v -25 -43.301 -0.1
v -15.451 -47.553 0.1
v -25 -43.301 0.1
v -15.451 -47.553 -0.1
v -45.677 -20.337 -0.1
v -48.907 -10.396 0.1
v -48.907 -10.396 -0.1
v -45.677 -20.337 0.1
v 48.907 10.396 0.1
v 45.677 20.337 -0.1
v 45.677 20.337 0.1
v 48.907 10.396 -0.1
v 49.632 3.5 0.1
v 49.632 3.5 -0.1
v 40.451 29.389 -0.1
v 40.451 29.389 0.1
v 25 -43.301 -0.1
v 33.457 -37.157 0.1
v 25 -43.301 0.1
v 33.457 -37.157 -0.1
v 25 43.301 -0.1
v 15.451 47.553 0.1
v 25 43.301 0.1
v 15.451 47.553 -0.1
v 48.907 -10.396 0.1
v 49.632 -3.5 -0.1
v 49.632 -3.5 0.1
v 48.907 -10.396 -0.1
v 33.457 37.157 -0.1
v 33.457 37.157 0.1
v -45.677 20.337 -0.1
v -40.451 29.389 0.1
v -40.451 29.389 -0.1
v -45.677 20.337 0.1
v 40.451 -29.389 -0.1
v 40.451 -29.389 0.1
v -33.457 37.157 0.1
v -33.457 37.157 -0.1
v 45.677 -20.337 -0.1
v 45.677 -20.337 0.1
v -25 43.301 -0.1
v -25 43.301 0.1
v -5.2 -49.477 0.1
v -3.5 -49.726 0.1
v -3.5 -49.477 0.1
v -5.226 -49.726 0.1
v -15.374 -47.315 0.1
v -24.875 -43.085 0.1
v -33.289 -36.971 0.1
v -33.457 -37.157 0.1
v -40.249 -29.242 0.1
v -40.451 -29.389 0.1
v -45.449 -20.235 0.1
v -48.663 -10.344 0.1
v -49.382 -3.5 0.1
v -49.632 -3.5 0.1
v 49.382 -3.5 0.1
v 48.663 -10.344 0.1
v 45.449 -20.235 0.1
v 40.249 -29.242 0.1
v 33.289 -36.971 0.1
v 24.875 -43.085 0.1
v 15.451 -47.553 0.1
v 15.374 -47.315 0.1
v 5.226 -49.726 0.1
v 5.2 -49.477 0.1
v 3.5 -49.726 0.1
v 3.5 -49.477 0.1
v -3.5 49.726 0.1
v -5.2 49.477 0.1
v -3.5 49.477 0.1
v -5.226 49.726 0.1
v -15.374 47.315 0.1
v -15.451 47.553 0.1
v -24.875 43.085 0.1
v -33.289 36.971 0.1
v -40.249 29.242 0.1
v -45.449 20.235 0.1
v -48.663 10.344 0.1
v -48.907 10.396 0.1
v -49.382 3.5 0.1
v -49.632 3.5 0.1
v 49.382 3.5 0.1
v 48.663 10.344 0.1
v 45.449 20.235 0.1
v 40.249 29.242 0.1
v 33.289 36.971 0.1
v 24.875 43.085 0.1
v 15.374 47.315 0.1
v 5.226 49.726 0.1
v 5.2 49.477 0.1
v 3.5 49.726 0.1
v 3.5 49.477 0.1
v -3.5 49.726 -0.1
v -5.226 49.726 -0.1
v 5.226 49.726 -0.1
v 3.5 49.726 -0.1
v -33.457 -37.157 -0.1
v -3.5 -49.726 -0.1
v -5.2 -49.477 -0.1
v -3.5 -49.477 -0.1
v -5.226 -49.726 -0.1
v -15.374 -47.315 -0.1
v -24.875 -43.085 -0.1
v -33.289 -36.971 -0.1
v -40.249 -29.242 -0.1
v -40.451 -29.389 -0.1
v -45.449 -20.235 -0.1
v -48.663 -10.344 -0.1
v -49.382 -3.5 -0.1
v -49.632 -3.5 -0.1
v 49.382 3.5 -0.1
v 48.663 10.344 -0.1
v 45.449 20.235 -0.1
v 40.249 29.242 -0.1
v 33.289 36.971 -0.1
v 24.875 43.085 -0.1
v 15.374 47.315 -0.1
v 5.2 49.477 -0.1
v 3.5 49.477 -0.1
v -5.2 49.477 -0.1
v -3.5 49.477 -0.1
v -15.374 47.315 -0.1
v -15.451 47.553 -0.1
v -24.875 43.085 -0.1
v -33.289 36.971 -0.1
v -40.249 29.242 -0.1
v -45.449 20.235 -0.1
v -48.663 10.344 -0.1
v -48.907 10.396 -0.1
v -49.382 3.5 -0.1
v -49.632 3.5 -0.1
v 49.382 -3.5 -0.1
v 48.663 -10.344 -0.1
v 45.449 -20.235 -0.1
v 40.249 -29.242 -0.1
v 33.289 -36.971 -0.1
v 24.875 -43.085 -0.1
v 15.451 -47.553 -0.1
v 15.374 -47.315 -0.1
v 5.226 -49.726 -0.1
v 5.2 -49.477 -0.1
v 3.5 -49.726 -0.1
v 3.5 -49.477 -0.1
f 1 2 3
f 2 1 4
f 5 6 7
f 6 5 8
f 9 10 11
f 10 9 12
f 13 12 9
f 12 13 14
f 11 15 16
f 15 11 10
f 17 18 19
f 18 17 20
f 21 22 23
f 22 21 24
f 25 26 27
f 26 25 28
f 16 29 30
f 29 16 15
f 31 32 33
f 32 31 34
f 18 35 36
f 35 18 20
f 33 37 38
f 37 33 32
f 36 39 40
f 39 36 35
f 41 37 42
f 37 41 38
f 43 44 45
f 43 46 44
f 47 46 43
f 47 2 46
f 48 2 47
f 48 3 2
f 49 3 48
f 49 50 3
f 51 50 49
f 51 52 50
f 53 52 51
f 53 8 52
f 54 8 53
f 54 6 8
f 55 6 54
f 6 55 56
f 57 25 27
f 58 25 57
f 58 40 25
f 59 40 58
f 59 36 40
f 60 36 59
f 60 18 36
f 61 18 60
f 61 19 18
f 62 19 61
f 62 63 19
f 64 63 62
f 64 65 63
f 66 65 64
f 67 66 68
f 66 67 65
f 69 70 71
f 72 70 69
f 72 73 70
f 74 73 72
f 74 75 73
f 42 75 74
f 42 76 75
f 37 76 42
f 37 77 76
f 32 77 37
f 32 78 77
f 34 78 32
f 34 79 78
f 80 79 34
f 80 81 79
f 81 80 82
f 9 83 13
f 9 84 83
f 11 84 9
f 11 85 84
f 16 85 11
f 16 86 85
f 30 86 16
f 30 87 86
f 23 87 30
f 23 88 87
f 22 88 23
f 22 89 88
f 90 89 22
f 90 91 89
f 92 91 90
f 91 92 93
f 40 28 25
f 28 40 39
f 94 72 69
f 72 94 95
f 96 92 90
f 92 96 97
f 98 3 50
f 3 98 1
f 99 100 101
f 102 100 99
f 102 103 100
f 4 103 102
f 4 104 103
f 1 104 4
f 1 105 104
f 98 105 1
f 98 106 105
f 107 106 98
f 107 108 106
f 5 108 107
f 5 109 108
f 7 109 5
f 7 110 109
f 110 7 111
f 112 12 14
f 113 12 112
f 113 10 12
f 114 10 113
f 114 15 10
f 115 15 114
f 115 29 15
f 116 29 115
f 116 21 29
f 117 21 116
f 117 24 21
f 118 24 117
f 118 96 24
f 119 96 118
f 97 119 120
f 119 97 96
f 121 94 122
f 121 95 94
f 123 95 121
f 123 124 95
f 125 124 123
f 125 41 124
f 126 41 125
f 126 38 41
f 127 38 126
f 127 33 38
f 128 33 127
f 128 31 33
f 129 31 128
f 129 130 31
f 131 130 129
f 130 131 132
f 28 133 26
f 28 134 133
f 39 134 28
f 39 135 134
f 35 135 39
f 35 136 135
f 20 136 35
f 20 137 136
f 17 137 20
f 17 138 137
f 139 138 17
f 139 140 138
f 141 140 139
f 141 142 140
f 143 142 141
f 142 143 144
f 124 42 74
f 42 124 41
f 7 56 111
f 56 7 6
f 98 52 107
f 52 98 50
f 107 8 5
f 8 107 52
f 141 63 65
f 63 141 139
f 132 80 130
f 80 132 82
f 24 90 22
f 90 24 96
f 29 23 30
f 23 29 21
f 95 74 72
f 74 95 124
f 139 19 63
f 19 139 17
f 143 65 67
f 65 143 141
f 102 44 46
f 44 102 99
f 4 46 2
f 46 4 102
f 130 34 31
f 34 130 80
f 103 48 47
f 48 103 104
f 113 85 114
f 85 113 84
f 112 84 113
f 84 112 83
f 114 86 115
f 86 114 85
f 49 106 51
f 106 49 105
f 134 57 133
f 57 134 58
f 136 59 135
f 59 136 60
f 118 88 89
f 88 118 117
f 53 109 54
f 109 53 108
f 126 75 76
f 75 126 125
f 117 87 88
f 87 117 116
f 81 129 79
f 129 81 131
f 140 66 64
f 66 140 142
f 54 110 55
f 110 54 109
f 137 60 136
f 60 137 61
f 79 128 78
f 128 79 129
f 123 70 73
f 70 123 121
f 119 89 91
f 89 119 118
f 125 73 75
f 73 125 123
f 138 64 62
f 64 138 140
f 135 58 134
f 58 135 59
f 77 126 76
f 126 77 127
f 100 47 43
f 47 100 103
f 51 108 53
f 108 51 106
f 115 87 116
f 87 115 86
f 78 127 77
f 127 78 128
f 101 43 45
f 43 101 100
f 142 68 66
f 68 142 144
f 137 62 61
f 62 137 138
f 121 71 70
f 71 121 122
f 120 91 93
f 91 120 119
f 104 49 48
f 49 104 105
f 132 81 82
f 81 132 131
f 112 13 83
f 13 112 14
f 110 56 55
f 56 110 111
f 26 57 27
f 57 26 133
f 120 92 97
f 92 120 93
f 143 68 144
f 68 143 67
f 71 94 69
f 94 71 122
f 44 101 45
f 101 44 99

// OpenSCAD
difference(){
    cylinder(h=0.2, d=100, center=true);
    cylinder(h=1, d=99.5, center=true);
    cube([110,7,1],center=true);
    cube([7,110,1],center=true);
}
